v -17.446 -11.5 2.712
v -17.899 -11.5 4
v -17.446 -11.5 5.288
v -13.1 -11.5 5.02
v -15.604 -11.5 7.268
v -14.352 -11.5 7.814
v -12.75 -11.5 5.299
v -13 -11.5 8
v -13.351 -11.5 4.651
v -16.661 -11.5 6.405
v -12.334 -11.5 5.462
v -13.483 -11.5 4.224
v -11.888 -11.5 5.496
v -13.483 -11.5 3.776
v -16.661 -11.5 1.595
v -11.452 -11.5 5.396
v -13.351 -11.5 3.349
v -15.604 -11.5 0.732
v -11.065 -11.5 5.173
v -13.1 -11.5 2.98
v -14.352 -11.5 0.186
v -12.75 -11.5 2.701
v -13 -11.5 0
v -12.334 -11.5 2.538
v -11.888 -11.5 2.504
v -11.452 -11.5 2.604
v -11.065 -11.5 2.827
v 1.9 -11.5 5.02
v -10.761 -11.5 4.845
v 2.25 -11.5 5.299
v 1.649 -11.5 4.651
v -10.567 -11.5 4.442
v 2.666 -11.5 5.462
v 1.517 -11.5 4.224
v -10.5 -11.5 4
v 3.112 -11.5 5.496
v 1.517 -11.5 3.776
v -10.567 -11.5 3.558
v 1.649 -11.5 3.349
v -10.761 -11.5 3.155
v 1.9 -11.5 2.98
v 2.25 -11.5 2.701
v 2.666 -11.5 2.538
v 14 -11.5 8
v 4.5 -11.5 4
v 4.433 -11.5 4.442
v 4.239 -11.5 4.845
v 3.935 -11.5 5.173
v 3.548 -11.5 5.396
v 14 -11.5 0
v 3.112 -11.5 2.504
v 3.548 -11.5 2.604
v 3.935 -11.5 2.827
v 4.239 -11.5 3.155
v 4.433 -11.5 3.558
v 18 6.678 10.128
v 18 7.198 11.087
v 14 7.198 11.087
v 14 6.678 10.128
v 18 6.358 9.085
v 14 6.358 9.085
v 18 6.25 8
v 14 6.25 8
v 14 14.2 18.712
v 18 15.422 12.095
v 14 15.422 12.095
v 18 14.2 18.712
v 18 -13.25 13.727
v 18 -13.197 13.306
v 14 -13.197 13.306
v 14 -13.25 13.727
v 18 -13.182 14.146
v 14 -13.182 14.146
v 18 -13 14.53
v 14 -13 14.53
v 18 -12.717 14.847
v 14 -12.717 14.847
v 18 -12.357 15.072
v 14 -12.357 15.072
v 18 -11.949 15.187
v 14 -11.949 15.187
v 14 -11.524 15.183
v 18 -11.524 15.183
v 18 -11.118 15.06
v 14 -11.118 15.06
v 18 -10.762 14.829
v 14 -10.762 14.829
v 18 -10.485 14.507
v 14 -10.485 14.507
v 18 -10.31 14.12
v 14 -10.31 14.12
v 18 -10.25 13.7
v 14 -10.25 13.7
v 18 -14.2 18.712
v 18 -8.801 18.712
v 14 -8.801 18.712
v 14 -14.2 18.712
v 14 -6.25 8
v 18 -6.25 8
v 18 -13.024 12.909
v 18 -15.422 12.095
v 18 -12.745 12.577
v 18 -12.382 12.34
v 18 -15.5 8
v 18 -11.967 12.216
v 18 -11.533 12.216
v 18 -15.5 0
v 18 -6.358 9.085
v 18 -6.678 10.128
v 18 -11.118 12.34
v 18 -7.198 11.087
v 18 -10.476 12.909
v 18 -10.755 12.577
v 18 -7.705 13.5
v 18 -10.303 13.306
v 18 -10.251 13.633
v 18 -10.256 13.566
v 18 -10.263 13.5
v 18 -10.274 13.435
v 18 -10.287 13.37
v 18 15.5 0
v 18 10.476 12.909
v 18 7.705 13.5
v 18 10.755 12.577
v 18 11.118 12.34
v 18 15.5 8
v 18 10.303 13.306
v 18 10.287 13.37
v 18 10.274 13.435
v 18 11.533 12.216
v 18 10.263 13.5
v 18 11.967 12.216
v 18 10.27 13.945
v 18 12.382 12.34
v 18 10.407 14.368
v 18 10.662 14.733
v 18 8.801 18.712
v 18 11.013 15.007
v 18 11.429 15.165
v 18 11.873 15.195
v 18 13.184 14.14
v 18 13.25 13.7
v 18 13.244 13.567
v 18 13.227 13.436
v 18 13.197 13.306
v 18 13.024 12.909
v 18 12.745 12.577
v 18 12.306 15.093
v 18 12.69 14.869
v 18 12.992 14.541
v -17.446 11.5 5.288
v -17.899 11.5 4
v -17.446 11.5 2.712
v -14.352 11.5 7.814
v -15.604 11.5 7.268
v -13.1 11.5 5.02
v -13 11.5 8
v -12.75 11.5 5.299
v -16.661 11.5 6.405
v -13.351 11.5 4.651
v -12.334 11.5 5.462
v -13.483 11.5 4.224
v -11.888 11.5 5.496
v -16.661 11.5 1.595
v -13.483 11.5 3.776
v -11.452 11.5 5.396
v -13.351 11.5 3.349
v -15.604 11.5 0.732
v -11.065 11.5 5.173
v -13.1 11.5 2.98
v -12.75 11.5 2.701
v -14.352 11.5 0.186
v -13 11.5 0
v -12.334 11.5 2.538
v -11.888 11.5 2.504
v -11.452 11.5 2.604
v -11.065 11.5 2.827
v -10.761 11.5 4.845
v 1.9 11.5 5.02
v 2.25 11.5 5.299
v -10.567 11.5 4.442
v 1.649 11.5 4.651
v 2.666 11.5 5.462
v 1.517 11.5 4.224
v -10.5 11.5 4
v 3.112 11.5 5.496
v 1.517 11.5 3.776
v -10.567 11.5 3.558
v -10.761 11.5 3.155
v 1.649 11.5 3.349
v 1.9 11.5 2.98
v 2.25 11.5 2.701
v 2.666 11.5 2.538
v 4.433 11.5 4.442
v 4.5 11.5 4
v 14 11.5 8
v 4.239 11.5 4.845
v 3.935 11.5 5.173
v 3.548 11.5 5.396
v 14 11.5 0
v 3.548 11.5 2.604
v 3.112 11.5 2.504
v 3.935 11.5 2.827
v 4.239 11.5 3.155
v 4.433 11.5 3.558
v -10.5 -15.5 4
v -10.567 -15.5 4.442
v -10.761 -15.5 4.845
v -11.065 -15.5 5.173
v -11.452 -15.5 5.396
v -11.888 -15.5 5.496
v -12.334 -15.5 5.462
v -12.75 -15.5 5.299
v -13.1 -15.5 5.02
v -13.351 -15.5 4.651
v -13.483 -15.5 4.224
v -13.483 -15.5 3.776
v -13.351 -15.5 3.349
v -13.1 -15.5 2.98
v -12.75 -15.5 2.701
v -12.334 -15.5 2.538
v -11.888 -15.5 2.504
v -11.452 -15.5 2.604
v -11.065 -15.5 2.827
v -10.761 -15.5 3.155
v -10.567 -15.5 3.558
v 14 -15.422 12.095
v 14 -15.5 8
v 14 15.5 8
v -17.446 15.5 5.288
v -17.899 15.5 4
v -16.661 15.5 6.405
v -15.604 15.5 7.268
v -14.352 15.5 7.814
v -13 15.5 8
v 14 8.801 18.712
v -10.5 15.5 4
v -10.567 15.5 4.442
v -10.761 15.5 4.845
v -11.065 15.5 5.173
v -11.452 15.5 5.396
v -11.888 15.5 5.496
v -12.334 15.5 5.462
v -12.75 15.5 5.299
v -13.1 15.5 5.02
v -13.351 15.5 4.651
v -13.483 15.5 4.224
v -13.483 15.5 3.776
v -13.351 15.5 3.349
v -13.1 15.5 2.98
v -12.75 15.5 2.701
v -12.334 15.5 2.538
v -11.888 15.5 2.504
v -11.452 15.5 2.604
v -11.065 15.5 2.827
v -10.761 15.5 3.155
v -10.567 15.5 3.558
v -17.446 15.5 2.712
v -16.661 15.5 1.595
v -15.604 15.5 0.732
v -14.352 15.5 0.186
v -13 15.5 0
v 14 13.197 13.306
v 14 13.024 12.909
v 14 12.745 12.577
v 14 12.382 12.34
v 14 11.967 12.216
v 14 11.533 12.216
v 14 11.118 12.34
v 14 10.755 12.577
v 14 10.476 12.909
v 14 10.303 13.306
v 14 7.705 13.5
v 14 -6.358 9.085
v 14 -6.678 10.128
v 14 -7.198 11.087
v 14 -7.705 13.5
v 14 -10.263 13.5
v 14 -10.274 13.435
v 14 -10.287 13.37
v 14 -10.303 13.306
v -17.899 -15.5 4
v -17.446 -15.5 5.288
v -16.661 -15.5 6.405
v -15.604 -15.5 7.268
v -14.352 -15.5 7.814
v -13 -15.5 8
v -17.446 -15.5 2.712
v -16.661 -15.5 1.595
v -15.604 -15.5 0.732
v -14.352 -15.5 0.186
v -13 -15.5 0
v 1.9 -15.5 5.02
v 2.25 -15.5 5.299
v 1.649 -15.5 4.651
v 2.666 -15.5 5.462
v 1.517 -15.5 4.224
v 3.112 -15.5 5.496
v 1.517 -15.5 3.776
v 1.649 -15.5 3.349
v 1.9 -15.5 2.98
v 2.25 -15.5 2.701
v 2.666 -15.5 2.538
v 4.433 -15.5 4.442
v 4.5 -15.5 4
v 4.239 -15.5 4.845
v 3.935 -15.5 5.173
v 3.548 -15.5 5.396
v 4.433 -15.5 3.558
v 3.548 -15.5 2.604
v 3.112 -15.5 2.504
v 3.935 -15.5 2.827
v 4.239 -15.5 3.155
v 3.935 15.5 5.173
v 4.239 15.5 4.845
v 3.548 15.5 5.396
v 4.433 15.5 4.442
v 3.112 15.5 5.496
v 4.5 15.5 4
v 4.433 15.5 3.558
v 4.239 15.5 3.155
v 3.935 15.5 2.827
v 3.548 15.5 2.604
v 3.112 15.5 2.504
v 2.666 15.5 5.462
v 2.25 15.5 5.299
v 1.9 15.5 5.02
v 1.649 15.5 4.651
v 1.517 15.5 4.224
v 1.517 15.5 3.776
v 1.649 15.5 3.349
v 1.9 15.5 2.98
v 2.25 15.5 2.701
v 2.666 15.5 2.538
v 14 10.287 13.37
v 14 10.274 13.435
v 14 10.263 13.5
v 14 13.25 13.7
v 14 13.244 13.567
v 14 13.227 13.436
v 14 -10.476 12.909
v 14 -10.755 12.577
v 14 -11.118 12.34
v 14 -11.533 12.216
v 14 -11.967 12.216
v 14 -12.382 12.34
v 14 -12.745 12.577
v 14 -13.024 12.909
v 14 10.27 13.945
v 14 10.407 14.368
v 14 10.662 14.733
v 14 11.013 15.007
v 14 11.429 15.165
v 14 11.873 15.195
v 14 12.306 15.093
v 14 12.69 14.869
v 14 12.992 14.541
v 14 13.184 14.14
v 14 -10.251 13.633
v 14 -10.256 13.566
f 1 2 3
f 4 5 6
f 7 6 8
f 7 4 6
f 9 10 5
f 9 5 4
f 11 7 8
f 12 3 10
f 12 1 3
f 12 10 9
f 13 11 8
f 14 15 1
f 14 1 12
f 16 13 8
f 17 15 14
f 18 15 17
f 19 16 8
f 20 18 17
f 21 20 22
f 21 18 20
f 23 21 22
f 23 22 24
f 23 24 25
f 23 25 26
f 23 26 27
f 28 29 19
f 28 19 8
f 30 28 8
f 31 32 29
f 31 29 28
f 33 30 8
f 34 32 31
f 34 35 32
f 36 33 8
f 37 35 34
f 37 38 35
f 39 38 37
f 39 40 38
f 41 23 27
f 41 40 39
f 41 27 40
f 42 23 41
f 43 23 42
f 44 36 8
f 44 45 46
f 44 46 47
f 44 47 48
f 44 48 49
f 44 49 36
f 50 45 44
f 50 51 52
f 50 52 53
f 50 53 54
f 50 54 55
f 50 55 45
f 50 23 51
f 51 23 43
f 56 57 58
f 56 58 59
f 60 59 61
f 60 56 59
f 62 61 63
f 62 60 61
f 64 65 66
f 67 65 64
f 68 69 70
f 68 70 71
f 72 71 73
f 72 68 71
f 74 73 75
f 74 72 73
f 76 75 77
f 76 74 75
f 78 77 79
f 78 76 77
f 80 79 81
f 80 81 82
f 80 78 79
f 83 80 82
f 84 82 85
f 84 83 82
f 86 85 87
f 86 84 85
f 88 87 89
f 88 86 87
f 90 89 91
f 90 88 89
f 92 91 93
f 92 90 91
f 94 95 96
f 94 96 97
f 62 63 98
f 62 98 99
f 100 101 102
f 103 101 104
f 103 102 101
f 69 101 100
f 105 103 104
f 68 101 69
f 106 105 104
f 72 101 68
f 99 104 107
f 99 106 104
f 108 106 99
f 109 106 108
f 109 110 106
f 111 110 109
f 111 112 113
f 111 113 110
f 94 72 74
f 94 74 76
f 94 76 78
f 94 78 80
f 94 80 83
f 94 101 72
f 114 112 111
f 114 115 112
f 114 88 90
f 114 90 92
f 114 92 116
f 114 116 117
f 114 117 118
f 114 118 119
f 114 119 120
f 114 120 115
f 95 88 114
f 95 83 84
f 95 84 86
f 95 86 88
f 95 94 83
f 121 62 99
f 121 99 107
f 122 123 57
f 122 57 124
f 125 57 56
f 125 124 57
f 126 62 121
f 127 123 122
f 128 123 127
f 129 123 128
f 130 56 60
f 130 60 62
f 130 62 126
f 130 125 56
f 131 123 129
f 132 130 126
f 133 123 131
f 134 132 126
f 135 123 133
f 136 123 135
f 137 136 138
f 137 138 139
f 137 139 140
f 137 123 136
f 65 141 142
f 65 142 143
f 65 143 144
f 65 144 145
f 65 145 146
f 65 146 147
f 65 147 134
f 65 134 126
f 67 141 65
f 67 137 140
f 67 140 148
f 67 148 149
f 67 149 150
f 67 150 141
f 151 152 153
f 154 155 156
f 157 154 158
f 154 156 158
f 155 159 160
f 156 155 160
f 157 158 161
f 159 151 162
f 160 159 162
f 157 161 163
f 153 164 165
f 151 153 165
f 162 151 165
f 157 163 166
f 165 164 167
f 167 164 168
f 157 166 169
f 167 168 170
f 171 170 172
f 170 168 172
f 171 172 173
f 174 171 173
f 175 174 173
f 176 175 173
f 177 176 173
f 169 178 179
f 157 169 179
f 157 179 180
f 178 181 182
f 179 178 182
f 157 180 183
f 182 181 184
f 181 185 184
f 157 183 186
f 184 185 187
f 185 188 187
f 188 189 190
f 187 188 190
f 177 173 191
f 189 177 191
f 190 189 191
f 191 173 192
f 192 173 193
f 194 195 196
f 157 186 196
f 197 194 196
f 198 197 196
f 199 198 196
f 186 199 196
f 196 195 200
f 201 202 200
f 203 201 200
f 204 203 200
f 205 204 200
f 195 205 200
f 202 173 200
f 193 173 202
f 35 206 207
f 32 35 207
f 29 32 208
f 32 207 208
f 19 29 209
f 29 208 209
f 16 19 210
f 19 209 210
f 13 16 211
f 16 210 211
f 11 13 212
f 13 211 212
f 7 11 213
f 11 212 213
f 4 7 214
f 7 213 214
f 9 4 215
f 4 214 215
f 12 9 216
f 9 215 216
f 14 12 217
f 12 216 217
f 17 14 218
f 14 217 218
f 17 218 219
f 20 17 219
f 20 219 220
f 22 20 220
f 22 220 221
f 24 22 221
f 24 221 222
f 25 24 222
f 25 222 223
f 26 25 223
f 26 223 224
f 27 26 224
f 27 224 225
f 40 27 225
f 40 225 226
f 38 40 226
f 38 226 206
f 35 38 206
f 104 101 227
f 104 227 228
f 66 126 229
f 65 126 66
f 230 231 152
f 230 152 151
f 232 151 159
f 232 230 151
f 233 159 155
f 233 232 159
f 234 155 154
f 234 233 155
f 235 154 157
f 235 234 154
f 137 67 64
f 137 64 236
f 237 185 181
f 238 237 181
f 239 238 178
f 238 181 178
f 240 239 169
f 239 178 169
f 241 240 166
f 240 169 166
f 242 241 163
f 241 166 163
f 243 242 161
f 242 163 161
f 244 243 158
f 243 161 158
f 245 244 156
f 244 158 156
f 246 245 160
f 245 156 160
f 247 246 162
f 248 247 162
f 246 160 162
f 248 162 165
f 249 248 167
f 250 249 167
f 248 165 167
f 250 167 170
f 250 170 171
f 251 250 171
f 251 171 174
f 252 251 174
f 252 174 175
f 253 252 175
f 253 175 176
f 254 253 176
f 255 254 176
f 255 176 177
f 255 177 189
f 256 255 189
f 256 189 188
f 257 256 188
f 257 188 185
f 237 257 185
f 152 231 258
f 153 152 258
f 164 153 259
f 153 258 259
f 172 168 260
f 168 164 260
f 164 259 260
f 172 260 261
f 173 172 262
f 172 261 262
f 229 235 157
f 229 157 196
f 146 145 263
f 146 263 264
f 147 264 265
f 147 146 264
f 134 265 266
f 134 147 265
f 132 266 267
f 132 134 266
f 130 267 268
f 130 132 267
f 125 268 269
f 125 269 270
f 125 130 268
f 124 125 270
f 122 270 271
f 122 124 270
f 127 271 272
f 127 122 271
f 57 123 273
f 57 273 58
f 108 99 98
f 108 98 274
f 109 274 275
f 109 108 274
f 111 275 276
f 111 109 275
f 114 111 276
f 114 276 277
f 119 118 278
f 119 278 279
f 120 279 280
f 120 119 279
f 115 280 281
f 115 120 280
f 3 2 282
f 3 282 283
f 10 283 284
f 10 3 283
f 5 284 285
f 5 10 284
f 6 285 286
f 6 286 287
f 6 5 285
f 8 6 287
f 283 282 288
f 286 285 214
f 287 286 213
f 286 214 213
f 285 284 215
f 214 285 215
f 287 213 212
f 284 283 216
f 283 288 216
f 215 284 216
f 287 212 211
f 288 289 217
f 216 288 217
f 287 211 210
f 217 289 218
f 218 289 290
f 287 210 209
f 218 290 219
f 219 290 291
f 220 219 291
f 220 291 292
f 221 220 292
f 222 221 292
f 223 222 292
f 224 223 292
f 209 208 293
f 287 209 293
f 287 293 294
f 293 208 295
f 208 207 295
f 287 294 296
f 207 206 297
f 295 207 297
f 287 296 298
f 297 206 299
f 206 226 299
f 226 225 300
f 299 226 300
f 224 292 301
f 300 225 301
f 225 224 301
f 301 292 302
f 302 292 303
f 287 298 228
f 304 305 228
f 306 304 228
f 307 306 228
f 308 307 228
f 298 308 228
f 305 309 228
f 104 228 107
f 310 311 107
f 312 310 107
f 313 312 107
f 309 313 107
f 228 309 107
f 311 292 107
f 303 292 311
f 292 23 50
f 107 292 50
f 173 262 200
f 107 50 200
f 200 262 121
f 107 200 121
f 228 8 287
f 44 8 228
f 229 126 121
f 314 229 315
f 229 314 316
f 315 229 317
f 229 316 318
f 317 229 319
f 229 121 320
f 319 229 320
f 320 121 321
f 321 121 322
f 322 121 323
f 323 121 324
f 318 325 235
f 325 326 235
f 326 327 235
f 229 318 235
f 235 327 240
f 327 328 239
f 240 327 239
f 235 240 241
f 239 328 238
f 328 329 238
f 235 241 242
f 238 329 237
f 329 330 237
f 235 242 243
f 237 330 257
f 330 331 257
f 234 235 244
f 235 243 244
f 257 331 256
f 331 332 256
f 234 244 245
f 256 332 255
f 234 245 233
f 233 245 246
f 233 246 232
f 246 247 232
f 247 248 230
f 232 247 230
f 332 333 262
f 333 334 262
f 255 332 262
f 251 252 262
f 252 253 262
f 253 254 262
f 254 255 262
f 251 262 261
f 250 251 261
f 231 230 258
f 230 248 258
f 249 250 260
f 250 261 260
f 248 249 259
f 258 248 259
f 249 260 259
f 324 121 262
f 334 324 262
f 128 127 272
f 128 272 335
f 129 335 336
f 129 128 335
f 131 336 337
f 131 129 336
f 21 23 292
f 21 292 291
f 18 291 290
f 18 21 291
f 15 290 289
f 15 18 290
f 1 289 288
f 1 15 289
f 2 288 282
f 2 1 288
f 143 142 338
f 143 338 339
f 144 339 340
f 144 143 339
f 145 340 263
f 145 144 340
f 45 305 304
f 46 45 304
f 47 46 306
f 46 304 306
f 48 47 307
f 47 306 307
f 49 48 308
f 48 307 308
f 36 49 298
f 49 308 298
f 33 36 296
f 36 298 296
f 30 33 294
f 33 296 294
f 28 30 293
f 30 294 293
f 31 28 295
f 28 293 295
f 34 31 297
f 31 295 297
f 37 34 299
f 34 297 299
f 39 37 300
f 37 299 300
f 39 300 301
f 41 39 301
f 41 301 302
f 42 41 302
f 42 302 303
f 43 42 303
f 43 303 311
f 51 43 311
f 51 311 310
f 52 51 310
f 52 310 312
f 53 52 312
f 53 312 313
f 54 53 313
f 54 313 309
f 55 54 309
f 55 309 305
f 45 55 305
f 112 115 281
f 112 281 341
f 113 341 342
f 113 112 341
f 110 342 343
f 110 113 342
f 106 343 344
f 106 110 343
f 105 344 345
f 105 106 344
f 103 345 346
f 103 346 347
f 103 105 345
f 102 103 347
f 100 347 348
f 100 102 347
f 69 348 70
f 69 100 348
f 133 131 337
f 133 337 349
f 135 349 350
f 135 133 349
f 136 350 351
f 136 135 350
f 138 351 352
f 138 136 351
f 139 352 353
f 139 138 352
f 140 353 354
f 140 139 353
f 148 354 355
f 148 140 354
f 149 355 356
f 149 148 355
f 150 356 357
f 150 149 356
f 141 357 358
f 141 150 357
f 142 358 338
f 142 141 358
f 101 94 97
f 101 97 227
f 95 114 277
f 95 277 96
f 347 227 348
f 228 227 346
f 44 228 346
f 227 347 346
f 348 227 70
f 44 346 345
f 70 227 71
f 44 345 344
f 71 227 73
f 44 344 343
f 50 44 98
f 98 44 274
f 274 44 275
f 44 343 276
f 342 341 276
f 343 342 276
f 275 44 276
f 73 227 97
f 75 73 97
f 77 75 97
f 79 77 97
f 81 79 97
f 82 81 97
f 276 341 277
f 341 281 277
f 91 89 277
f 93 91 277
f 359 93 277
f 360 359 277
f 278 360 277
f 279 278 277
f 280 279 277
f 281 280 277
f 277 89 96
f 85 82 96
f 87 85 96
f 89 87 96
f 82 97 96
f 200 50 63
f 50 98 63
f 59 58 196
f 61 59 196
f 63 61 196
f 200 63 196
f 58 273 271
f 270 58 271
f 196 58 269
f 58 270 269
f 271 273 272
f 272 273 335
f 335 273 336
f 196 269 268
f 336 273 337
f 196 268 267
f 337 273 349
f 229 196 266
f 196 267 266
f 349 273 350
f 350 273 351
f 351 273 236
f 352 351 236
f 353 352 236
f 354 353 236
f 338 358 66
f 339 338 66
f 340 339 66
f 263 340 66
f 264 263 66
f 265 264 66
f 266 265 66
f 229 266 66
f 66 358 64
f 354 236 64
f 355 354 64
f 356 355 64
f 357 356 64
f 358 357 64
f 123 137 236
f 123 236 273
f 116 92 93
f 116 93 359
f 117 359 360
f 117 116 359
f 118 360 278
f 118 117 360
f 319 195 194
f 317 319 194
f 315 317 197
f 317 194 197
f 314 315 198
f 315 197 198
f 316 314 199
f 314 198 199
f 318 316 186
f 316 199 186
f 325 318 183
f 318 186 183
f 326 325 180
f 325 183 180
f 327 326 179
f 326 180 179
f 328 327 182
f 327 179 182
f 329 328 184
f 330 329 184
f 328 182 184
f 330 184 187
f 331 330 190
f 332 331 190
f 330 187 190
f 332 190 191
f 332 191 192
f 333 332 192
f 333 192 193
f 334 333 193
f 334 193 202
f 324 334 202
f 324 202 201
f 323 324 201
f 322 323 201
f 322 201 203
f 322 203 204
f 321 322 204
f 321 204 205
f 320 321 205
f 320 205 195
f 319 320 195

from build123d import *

# Parameters (mm, degrees)
F0_W        = 32
F0_H        = 4
F1_DEPTH    = 8
F3_DEPTH    = 4
F4_DEPTH    = 25
F5_R        = 1.5
F6_DEPTH    = 40
F7_T1_DEPTH = 29
F7_T3_DEPTH = 29


# Not quite as in the source:
# - a fillet or chamfer that OpenCascade refuses, or shapes differently, is made with other operations: its cross-section is extruded or revolved along the edge and cut away or added


with BuildPart() as f1:
    # F0 (on Top) → F1 (new body)
    with BuildSketch(Plane.XY):
        with Locations((-2, 13.5)):
            Rectangle(F0_W, F0_H)
        Polygon((14, 11.5), (14, -11.5), (14, -15.5), (18, -15.5), (18, 0), (18, 15.5), (14, 15.5), align=None)
        with Locations((-2, -13.5)):
            Rectangle(F0_W, F0_H)
    extrude(amount=F1_DEPTH)

    # F2 (on face) → F3 (join, through all)
    with BuildSketch(Plane.YZ.offset(18)):
        with BuildLine():
            Line((-15.4216540828, 12.0949916113), (-15.5, 8))
            Line((-15.5, 8), (-6.25, 8))
            ThreePointArc((-6.25, 8), (-6.4923756022, 9.6147401314), (-7.1981402517, 11.0871625858))
            ThreePointArc((-7.1981402517, 11.0871625858), (-8.5517740167, 12.4745223834), (-10.3026318448, 13.3061403509))
            ThreePointArc((-10.3026318448, 13.3061403509), (-11.75, 12.2), (-13.1973681552, 13.3061403509))
            ThreePointArc((-13.1973681552, 13.3061403509), (-14.3801744212, 12.8303397928), (-15.4216540828, 12.0949916113))
        make_face()
        with BuildLine():
            Line((6.25, 8), (11.75, 8))
            Line((11.75, 8), (15.5, 8))
            Line((15.5, 8), (15.4216540828, 12.0949916113))
            ThreePointArc((15.4216540828, 12.0949916113), (14.3801744212, 12.8303397928), (13.1973681552, 13.3061403509))
            ThreePointArc((13.1973681552, 13.3061403509), (11.75, 12.2), (10.3026318448, 13.3061403509))
            ThreePointArc((10.3026318448, 13.3061403509), (8.5517740167, 12.4745223834), (7.1981402517, 11.0871625858))
            ThreePointArc((7.1981402517, 11.0871625858), (6.4923756022, 9.6147401314), (6.25, 8))
        make_face()
        with BuildLine():
            Line((-14.1999293119, 18.7123082578), (-15.4216540828, 12.0949916113))
            ThreePointArc((-15.4216540828, 12.0949916113), (-14.3801744212, 12.8303397928), (-13.1973681552, 13.3061403509))
            ThreePointArc((-13.1973681552, 13.3061403509), (-11.9486803553, 15.1867838163), (-10.25, 13.7))
            ThreePointArc((-10.25, 13.7), (-10.2533520267, 13.5997760311), (-10.2633931253, 13.5))
            Line((-10.2633931253, 13.5), (-7.7054746686, 13.5))
            Line((-7.7054746686, 13.5), (-8.8014388457, 18.7123082578))
            Line((-8.8014388457, 18.7123082578), (-14.1999293119, 18.7123082578))
        make_face()
        with BuildLine():
            ThreePointArc((-10.3026318448, 13.3061403509), (-8.5517740167, 12.4745223834), (-7.1981402517, 11.0871625858))
            Line((-7.1981402517, 11.0871625858), (-7.7054746686, 13.5))
            Line((-7.7054746686, 13.5), (-10.2633931253, 13.5))
            ThreePointArc((-10.2633931253, 13.5), (-10.2798136989, 13.4024227159), (-10.3026318448, 13.3061403509))
        make_face()
        with BuildLine():
            ThreePointArc((13.1973681552, 13.3061403509), (14.3801744212, 12.8303397928), (15.4216540828, 12.0949916113))
            Line((15.4216540828, 12.0949916113), (14.1999293119, 18.7123082578))
            Line((14.1999293119, 18.7123082578), (8.8014388457, 18.7123082578))
            Line((8.8014388457, 18.7123082578), (7.7054746686, 13.5))
            Line((7.7054746686, 13.5), (10.2633931253, 13.5))
            ThreePointArc((10.2633931253, 13.5), (11.6497760311, 15.1966479733), (13.25, 13.7))
            ThreePointArc((13.25, 13.7), (13.2367838163, 13.5013196447), (13.1973681552, 13.3061403509))
        make_face()
        with BuildLine():
            Line((7.7054746686, 13.5), (7.1981402517, 11.0871625858))
            ThreePointArc((7.1981402517, 11.0871625858), (8.5517740167, 12.4745223834), (10.3026318448, 13.3061403509))
            ThreePointArc((10.3026318448, 13.3061403509), (10.2798136989, 13.4024227159), (10.2633931253, 13.5))
            Line((10.2633931253, 13.5), (7.7054746686, 13.5))
        make_face()
    extrude(amount=-F3_DEPTH)

    # F2 (on face) → F4 (cut)
    with BuildSketch(Plane.YZ.offset(18)):
        with BuildLine():
            ThreePointArc((10.2633931253, 13.5), (10.2798136989, 13.4024227159), (10.3026318448, 13.3061403509))
            ThreePointArc((10.3026318448, 13.3061403509), (11.0198534153, 13.4513196535), (11.75, 13.5))
            Line((11.75, 13.5), (10.2633931253, 13.5))
        make_face()
        with BuildLine():
            ThreePointArc((11.75, 13.5), (11.0198534153, 13.4513196535), (10.3026318448, 13.3061403509))
            ThreePointArc((10.3026318448, 13.3061403509), (11.75, 12.2), (13.1973681552, 13.3061403509))
            ThreePointArc((13.1973681552, 13.3061403509), (12.4801465847, 13.4513196535), (11.75, 13.5))
        make_face()
        with BuildLine():
            ThreePointArc((11.75, 13.5), (12.4801465847, 13.4513196535), (13.1973681552, 13.3061403509))
            ThreePointArc((13.1973681552, 13.3061403509), (13.2367838163, 13.5013196447), (13.25, 13.7))
            ThreePointArc((13.25, 13.7), (11.6497760311, 15.1966479733), (10.2633931253, 13.5))
            Line((10.2633931253, 13.5), (11.75, 13.5))
        make_face()
        with BuildLine():
            ThreePointArc((-11.75, 13.5), (-12.4801465847, 13.4513196535), (-13.1973681552, 13.3061403509))
            ThreePointArc((-13.1973681552, 13.3061403509), (-11.75, 12.2), (-10.3026318448, 13.3061403509))
            ThreePointArc((-10.3026318448, 13.3061403509), (-11.0198534153, 13.4513196535), (-11.75, 13.5))
        make_face()
        with BuildLine():
            ThreePointArc((-11.75, 13.5), (-11.0198534153, 13.4513196535), (-10.3026318448, 13.3061403509))
            ThreePointArc((-10.3026318448, 13.3061403509), (-10.2798136989, 13.4024227159), (-10.2633931253, 13.5))
            Line((-10.2633931253, 13.5), (-11.75, 13.5))
        make_face()
        with BuildLine():
            ThreePointArc((-10.25, 13.7), (-11.9486803553, 15.1867838163), (-13.1973681552, 13.3061403509))
            ThreePointArc((-13.1973681552, 13.3061403509), (-12.4801465847, 13.4513196535), (-11.75, 13.5))
            Line((-11.75, 13.5), (-10.2633931253, 13.5))
            ThreePointArc((-10.2633931253, 13.5), (-10.2533520267, 13.5997760311), (-10.25, 13.7))
        make_face()
    extrude(amount=-F4_DEPTH, mode=Mode.SUBTRACT)

    # F5 (on face) → F6 (cut)
    with BuildSketch(Plane.XZ.offset(15.5)):
        with Locations((-12, 4)):
            Circle(F5_R)
        with Locations((3, 4)):
            Circle(F5_R)
    extrude(amount=-F6_DEPTH, mode=Mode.SUBTRACT)

    # F7: fillet of radius 5 on 4 edges, made by hand

    # F7_s2 → F7_t1 (cut)
    with BuildSketch(Plane.XZ.offset(-1)):
        with BuildLine():
            ThreePointArc((-18, 3), (-16.5355339059, 6.5355339059), (-13, 8))
            Line((-13, 8), (-18, 8))
            Line((-18, 8), (-18, 3))
        make_face()
        with BuildLine():
            ThreePointArc((-13, 0), (-16.5355339059, 1.4644660941), (-18, 5))
            Line((-18, 5), (-18, 0))
            Line((-18, 0), (-13, 0))
        make_face()
    extrude(amount=F7_T1_DEPTH, mode=Mode.SUBTRACT)

    # F7_s4 → F7_t3 (cut)
    with BuildSketch(Plane.XZ.offset(-28)):
        with BuildLine():
            ThreePointArc((-18, 3), (-16.5355339059, 6.5355339059), (-13, 8))
            Line((-13, 8), (-18, 8))
            Line((-18, 8), (-18, 3))
        make_face()
        with BuildLine():
            ThreePointArc((-18, 5), (-16.5355339059, 1.4644660941), (-13, 0))
            Line((-13, 0), (-18, 0))
            Line((-18, 0), (-18, 5))
        make_face()
    extrude(amount=F7_T3_DEPTH, mode=Mode.SUBTRACT)


solid = f1.part
